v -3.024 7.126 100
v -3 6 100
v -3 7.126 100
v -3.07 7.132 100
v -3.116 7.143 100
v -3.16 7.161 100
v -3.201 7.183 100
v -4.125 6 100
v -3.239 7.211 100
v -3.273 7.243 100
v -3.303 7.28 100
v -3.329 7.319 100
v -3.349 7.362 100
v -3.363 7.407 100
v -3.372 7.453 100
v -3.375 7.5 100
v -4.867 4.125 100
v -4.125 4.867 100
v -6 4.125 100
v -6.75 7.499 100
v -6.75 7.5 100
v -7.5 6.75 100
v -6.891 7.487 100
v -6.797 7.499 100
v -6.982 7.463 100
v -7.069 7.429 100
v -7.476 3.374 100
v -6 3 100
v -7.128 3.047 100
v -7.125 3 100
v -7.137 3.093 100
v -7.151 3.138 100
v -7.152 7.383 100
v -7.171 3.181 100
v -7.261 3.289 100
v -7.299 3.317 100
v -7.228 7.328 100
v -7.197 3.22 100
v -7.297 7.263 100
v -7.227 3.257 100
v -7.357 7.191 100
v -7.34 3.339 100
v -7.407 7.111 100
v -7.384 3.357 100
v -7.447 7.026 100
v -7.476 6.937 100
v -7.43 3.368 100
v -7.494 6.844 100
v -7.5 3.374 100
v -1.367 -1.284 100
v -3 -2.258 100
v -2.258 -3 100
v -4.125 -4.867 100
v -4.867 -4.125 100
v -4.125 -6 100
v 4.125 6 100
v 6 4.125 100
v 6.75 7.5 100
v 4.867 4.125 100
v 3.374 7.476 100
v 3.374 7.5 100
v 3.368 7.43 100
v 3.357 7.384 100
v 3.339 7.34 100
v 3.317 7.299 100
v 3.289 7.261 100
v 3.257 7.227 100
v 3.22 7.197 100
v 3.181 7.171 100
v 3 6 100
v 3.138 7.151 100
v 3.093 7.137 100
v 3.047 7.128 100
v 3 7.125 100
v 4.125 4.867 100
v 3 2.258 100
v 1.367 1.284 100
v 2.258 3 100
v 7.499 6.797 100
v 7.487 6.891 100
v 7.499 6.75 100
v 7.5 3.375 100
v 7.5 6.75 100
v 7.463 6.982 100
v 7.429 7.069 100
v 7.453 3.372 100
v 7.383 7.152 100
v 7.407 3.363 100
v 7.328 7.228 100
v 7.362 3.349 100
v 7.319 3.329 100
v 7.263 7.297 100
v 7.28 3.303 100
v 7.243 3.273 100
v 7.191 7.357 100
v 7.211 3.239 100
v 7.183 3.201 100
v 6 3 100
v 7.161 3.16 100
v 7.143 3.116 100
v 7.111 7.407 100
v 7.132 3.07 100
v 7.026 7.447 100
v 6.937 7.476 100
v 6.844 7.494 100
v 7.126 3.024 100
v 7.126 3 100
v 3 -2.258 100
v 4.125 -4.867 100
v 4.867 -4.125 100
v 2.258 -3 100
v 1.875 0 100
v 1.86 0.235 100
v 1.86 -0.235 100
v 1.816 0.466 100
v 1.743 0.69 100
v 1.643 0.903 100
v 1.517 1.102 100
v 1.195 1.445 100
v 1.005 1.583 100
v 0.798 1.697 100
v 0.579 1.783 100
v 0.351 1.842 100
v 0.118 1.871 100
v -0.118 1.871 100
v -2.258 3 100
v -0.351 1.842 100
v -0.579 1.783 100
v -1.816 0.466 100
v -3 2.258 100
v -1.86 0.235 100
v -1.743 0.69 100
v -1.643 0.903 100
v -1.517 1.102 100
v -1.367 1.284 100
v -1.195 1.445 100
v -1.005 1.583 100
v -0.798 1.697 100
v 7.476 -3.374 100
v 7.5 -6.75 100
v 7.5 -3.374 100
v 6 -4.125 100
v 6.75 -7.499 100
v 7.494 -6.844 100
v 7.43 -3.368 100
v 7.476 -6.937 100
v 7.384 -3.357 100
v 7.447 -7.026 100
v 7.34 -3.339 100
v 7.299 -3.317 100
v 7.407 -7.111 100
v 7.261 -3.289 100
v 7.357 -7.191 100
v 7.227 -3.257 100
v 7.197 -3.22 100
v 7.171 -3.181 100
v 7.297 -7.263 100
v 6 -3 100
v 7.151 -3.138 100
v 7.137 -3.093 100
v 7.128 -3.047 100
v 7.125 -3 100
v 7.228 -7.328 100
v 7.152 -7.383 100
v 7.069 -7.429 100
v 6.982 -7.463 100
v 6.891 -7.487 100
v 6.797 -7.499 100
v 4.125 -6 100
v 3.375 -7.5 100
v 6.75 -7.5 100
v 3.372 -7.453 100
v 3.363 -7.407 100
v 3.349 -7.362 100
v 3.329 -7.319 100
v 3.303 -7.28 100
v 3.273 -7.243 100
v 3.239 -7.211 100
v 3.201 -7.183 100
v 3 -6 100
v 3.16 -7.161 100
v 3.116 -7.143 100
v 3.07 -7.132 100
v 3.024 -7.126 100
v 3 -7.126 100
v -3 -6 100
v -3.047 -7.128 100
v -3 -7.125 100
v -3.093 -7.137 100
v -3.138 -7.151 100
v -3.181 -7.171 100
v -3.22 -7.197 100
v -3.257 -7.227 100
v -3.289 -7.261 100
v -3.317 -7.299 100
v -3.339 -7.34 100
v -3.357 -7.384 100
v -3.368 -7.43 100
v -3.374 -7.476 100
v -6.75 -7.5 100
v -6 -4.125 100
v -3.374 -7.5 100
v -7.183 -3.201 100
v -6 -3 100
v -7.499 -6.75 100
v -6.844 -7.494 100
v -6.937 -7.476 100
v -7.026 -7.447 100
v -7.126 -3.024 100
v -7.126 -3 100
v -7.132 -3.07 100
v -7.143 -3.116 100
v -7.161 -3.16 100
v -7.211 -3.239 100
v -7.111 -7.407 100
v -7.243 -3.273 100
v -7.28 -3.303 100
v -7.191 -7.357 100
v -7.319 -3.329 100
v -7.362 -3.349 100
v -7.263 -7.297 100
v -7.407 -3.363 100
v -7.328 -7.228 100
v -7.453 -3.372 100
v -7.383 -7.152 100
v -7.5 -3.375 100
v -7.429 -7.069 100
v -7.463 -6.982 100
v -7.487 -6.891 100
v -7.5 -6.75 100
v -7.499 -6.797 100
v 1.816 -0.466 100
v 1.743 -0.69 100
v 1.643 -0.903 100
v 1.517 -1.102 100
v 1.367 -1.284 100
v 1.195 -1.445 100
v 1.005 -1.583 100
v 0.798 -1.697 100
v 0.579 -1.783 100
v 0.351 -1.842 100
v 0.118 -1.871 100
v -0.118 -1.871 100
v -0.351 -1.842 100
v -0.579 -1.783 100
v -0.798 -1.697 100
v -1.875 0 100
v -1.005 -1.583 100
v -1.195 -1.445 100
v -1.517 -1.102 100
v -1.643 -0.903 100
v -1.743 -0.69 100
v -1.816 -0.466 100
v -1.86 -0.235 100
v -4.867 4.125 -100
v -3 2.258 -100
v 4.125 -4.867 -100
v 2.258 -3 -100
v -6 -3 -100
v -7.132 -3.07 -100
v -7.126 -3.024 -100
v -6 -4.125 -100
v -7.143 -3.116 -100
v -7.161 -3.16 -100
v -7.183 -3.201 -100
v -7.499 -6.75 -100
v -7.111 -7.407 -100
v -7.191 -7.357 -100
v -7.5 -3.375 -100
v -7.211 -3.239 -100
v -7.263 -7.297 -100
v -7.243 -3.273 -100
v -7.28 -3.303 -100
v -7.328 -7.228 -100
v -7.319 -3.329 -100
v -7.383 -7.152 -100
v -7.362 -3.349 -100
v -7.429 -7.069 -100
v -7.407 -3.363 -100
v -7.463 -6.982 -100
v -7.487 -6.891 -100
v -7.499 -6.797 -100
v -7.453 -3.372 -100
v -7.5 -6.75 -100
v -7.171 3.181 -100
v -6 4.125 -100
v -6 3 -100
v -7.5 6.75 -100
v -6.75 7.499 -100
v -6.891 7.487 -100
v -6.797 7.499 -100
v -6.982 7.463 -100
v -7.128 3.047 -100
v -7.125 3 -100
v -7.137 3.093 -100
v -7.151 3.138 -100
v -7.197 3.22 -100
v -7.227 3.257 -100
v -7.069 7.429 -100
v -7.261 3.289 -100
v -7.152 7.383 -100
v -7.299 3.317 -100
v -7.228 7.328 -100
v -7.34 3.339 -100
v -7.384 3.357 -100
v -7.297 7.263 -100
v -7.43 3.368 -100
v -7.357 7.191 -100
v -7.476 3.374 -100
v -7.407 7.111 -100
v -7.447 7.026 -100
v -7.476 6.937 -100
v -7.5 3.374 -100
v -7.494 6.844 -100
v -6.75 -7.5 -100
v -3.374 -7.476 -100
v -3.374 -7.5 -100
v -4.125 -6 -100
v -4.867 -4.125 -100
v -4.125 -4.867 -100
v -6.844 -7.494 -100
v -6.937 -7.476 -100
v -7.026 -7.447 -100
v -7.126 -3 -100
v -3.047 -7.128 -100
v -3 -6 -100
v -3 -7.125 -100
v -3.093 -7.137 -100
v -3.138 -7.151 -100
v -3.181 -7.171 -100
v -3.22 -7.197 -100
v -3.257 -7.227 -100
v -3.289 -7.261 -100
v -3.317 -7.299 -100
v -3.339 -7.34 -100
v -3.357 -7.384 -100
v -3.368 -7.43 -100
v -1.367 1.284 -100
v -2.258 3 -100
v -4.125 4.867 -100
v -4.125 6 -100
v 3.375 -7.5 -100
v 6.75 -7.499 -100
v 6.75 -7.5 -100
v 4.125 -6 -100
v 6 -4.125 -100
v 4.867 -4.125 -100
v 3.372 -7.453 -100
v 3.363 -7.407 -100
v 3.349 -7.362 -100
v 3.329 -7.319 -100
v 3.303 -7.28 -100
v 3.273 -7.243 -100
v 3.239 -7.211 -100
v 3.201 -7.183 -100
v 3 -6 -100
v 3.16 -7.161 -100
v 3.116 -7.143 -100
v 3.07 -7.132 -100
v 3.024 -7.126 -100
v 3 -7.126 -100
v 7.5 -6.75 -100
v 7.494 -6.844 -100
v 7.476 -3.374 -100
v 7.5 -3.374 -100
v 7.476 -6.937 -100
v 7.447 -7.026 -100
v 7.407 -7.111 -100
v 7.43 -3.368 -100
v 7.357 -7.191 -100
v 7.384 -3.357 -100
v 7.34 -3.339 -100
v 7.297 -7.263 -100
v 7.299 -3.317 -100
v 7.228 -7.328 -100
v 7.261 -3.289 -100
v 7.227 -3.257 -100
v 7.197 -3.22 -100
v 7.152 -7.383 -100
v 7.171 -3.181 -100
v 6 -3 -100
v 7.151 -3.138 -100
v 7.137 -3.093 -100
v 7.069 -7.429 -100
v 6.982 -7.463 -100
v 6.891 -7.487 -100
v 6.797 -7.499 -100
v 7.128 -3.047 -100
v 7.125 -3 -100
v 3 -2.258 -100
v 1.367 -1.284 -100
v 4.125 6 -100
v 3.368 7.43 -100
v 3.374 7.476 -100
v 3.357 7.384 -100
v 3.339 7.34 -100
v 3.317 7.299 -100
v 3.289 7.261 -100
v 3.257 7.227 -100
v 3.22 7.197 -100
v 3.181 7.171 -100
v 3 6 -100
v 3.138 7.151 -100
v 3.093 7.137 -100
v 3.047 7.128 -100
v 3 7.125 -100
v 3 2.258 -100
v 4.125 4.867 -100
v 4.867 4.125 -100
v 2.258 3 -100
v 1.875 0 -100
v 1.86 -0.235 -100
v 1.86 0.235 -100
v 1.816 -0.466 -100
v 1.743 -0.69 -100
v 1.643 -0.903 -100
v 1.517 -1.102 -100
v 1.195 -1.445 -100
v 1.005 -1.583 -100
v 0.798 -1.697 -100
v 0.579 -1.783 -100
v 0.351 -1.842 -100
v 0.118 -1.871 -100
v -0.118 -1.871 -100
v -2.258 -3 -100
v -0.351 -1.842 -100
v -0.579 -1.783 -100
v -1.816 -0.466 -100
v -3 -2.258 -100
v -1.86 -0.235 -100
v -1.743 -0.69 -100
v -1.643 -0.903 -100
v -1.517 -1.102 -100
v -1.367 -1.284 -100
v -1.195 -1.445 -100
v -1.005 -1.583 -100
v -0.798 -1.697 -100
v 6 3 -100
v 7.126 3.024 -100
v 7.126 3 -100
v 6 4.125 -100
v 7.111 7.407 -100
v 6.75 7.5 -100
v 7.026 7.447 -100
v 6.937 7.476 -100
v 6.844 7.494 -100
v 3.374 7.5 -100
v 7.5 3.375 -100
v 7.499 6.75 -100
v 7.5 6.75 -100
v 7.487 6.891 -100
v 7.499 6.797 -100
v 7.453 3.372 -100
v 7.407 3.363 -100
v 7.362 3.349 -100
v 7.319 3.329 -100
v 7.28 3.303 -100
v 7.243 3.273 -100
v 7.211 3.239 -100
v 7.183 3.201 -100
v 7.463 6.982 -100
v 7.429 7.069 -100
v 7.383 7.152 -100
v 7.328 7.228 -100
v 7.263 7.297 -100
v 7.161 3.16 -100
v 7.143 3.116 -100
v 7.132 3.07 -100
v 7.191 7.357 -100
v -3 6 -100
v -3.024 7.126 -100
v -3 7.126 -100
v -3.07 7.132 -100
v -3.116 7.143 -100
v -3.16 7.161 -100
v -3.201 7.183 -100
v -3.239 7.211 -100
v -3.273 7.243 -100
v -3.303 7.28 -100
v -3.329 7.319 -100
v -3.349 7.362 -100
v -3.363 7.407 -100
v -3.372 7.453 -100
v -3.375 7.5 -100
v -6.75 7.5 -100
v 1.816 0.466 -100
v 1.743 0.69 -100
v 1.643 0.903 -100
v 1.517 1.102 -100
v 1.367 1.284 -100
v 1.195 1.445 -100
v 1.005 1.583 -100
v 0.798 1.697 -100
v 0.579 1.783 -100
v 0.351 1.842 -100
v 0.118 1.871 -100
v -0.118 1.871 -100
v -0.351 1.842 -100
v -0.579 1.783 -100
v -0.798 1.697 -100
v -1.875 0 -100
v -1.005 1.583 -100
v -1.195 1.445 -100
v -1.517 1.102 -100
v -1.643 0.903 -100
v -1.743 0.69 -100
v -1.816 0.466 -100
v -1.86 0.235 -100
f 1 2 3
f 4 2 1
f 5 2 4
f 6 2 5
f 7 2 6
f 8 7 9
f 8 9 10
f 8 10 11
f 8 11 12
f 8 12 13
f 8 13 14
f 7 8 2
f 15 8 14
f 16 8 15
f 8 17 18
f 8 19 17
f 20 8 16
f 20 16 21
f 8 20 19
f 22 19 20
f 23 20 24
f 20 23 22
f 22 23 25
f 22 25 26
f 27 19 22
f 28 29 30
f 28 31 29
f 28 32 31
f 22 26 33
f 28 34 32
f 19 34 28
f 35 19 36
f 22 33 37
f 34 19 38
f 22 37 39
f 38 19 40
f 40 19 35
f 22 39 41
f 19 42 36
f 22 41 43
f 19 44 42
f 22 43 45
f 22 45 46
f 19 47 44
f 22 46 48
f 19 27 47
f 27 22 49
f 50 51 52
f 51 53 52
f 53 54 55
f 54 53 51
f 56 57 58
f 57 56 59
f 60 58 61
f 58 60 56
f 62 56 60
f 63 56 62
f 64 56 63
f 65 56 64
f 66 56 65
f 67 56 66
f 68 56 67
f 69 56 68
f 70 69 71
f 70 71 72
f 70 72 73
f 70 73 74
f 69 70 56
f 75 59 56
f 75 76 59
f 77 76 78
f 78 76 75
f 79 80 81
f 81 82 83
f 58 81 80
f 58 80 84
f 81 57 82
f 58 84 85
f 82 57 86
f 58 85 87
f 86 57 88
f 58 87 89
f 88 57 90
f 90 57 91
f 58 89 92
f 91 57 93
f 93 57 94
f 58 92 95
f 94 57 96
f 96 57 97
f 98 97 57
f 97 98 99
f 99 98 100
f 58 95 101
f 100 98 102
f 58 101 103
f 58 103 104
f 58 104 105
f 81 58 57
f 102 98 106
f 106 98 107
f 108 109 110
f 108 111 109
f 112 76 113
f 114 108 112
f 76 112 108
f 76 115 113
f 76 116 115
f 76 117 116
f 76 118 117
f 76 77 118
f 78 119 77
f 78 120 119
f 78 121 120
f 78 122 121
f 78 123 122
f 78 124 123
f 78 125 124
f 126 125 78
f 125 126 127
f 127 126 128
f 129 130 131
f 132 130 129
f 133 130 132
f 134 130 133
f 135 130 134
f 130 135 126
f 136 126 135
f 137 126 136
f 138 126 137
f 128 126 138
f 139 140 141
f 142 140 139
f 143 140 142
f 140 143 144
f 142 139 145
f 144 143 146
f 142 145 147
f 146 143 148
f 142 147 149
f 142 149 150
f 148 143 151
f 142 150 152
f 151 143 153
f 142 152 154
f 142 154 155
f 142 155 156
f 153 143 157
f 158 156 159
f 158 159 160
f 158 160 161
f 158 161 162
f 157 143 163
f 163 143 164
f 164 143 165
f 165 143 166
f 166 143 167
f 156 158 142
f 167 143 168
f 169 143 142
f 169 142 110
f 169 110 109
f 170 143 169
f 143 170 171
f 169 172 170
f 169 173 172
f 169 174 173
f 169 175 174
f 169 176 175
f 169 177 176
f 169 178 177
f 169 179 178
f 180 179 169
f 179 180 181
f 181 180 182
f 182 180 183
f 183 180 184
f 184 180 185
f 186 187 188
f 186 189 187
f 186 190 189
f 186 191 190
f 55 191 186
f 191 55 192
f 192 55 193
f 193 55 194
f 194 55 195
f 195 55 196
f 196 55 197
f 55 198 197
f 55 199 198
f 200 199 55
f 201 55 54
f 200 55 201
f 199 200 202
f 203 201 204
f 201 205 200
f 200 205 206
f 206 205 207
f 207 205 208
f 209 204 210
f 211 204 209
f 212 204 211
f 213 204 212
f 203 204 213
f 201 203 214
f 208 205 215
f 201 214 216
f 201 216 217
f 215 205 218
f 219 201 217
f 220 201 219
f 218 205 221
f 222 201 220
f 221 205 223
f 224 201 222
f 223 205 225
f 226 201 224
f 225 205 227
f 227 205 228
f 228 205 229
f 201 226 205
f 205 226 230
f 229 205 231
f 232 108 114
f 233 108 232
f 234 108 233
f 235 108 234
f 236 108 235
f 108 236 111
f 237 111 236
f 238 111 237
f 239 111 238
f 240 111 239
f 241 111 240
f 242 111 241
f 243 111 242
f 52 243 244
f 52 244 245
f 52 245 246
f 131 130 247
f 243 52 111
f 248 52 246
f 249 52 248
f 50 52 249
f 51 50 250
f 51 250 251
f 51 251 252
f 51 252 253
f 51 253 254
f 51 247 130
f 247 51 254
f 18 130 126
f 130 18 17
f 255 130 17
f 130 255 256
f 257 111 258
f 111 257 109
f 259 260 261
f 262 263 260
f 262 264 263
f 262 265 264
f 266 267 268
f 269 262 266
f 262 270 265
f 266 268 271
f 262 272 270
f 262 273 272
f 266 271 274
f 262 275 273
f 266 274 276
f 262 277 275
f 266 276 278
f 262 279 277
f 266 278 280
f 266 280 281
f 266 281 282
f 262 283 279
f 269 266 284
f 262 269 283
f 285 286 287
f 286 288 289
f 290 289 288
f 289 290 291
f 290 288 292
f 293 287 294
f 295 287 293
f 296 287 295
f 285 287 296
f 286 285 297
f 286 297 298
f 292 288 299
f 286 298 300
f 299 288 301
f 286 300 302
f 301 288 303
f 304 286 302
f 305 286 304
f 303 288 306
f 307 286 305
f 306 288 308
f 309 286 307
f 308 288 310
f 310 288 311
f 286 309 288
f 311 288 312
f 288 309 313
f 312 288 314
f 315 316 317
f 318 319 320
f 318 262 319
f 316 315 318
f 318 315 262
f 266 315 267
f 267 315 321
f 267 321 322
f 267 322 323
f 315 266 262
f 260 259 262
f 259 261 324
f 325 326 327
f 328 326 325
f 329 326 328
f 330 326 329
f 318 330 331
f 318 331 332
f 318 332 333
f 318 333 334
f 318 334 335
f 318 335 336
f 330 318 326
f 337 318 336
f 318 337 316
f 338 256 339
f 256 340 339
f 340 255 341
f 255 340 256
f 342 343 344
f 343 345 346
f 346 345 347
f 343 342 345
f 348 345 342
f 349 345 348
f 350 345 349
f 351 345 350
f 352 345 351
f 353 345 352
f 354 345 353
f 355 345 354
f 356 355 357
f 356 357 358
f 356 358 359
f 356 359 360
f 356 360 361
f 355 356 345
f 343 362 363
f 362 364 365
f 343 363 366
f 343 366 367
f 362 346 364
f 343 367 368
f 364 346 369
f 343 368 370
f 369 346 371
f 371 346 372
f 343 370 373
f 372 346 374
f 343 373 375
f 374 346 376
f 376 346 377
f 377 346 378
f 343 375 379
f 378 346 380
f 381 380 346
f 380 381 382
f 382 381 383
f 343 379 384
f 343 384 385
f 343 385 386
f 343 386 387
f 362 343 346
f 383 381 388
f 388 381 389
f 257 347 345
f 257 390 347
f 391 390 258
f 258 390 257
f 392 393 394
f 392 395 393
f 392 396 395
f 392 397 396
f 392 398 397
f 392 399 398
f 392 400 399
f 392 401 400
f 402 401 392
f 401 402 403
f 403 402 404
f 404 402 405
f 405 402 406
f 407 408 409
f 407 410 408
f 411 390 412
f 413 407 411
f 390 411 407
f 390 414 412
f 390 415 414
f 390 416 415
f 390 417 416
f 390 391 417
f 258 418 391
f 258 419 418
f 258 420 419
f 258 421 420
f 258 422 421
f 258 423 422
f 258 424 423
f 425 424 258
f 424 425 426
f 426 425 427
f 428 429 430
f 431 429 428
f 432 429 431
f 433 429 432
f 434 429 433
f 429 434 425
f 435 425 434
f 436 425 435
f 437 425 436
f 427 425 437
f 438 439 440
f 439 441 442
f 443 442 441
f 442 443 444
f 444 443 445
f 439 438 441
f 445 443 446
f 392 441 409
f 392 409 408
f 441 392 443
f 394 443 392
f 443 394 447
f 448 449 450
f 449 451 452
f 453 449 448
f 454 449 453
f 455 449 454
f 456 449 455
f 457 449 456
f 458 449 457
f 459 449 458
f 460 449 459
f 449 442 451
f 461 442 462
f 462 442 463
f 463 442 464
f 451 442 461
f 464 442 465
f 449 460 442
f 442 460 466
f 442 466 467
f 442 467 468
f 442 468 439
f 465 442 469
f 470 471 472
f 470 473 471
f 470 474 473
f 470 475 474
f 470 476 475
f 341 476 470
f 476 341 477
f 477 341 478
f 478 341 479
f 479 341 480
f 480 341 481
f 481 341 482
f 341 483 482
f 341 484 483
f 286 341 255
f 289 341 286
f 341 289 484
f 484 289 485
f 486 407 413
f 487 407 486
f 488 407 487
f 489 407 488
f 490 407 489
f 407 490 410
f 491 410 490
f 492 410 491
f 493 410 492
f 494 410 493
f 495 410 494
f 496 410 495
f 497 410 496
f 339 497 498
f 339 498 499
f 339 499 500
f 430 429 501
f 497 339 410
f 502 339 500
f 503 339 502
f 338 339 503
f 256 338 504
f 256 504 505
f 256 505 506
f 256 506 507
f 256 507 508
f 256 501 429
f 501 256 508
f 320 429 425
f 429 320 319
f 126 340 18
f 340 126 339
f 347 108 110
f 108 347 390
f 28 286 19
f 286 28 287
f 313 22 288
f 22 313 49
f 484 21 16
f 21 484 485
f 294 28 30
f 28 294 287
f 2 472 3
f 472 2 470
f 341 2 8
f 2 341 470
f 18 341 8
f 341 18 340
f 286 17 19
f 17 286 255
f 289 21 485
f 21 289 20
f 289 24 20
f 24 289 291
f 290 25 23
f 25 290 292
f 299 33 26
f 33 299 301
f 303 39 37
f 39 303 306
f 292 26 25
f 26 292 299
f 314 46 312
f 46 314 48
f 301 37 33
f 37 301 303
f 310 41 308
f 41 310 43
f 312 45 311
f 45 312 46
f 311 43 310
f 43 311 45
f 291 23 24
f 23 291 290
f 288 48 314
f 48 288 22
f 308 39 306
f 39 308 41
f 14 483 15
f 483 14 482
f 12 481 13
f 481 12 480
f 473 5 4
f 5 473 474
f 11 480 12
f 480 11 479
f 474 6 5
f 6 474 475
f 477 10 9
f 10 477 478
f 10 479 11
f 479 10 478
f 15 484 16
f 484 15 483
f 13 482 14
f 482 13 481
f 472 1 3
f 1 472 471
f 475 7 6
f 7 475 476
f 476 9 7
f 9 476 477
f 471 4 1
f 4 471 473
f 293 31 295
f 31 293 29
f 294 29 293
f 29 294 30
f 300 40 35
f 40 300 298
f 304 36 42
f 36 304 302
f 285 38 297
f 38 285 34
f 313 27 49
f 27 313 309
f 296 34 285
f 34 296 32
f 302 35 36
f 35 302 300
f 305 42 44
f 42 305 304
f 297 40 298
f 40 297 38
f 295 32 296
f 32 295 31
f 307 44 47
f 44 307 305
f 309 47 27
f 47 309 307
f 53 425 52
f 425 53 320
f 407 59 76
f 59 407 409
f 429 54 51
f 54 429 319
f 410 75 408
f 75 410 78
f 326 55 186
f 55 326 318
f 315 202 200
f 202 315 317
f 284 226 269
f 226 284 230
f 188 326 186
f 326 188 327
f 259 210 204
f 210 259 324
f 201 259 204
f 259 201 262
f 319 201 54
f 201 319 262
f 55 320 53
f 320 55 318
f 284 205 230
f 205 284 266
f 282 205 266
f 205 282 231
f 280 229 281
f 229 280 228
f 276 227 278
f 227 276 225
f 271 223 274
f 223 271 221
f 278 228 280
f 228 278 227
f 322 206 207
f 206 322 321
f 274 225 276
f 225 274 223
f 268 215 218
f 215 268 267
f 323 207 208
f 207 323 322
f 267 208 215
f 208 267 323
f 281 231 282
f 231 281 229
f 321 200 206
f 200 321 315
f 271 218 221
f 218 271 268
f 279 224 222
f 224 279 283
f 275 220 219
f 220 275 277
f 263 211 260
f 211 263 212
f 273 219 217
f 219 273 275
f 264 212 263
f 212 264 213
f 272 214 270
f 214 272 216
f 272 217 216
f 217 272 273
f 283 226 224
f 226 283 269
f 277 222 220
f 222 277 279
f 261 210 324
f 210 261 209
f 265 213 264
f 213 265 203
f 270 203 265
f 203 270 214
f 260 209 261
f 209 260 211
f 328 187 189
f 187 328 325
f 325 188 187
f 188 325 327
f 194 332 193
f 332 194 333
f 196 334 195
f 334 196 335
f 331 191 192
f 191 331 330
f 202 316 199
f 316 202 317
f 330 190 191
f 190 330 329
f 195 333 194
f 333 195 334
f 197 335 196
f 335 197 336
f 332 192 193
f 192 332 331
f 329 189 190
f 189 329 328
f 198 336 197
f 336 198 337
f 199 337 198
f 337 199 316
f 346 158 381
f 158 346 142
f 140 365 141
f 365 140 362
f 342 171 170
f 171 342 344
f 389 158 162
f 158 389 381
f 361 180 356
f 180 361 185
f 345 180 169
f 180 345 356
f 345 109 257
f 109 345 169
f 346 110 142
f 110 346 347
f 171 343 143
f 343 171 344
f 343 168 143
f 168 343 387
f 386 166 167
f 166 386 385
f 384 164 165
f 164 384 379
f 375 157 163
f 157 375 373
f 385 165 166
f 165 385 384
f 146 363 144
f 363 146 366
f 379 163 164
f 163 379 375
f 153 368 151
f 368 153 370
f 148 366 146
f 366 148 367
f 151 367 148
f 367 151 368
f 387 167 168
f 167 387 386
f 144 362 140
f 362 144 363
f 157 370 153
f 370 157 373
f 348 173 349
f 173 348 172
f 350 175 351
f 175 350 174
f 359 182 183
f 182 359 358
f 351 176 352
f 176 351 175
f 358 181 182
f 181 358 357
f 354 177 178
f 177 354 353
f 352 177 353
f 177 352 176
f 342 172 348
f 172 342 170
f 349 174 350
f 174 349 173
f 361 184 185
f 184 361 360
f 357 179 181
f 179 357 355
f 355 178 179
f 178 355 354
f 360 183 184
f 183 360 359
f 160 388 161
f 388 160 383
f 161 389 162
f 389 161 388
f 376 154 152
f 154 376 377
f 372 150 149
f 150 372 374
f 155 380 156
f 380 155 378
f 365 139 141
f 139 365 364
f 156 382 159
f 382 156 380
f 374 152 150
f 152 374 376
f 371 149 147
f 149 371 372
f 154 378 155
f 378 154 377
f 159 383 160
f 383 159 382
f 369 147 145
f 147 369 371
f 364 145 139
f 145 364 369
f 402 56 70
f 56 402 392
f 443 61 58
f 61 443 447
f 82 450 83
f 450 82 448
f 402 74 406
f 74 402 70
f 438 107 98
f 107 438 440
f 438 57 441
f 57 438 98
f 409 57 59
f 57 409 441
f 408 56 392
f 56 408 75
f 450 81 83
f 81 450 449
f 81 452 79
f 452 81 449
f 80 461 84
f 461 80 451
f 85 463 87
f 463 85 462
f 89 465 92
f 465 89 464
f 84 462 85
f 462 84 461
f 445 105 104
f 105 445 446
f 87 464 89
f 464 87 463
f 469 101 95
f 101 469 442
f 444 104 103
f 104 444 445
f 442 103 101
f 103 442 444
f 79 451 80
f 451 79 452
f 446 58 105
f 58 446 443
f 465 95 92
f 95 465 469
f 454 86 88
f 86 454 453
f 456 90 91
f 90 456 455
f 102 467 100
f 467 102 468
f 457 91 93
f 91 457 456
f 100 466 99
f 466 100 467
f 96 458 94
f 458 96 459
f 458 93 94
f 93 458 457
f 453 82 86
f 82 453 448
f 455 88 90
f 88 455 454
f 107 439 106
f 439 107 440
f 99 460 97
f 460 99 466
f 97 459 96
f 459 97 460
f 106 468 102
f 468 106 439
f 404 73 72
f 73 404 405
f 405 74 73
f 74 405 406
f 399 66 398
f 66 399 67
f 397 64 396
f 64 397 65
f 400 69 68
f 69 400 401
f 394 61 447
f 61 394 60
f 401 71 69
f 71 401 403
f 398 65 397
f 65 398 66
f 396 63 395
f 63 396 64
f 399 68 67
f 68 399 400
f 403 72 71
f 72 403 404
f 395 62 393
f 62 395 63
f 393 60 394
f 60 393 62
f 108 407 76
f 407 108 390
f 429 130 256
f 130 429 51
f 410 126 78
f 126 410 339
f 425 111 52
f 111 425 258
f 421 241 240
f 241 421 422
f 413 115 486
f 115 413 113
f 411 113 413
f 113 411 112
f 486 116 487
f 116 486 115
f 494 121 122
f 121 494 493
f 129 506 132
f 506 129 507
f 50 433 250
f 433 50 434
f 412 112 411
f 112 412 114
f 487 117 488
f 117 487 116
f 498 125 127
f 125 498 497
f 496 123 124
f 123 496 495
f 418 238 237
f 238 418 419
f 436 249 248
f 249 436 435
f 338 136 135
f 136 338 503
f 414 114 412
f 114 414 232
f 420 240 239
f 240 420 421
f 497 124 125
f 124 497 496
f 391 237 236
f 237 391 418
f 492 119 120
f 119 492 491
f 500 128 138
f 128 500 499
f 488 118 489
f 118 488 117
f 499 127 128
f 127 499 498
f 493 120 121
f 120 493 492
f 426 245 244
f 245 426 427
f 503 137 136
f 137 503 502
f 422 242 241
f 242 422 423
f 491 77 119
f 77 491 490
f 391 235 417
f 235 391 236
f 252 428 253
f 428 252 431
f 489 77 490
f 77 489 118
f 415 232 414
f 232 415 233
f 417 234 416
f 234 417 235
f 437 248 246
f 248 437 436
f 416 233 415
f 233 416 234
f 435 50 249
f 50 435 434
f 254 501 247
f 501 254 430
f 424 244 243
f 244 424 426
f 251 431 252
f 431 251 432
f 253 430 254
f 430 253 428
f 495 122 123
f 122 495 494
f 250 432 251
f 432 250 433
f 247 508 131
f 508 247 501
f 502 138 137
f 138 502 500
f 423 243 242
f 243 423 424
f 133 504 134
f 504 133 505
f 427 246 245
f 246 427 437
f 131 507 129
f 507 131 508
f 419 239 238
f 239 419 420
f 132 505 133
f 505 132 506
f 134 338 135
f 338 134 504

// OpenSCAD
//Credit: https://www.thingiverse.com/thing:27825/files

$fn=50;

module makerBeam(length)
{
	difference(){
		union(){
			// body
			cube([8,8,length], center=true);
			// corners
			for (i=[0:3]){
				rotate([0, 0, i*90]){corner(length);}
			}
		}
		// center hole
		cylinder(h=length, r=2.5, center=true);
	};
}

module corner(length){
	difference(){
		union(){
			// arm
			rotate([0, 0, 45]){
				translate([0,5,0]){cube([1.4, 15, length], center=true);}
			}

			translate([-9, 7, 0]){cube([2, 6, length], center=true);}
			translate([-7, 9, 0]){cube([6, 2, length], center=true);}
			translate([-7, 7, 0]){cube([3, 3, length], center=true);}
		}

		translate([-4, 10, 0]){cylinder(h=length, r=0.5, center=true);}
		translate([-10, 4, 0]){cylinder(h=length, r=0.5, center=true);}

		// round external shape
		difference(){
			translate([-9.5, 9.5, 0]){cube([1, 1, length], center=true);}
			translate([-9, 9, 0]){cylinder(h=length, r=1, center=true);}
		}
	}
}


scale(15/20)makerBeam(200*20/15);
